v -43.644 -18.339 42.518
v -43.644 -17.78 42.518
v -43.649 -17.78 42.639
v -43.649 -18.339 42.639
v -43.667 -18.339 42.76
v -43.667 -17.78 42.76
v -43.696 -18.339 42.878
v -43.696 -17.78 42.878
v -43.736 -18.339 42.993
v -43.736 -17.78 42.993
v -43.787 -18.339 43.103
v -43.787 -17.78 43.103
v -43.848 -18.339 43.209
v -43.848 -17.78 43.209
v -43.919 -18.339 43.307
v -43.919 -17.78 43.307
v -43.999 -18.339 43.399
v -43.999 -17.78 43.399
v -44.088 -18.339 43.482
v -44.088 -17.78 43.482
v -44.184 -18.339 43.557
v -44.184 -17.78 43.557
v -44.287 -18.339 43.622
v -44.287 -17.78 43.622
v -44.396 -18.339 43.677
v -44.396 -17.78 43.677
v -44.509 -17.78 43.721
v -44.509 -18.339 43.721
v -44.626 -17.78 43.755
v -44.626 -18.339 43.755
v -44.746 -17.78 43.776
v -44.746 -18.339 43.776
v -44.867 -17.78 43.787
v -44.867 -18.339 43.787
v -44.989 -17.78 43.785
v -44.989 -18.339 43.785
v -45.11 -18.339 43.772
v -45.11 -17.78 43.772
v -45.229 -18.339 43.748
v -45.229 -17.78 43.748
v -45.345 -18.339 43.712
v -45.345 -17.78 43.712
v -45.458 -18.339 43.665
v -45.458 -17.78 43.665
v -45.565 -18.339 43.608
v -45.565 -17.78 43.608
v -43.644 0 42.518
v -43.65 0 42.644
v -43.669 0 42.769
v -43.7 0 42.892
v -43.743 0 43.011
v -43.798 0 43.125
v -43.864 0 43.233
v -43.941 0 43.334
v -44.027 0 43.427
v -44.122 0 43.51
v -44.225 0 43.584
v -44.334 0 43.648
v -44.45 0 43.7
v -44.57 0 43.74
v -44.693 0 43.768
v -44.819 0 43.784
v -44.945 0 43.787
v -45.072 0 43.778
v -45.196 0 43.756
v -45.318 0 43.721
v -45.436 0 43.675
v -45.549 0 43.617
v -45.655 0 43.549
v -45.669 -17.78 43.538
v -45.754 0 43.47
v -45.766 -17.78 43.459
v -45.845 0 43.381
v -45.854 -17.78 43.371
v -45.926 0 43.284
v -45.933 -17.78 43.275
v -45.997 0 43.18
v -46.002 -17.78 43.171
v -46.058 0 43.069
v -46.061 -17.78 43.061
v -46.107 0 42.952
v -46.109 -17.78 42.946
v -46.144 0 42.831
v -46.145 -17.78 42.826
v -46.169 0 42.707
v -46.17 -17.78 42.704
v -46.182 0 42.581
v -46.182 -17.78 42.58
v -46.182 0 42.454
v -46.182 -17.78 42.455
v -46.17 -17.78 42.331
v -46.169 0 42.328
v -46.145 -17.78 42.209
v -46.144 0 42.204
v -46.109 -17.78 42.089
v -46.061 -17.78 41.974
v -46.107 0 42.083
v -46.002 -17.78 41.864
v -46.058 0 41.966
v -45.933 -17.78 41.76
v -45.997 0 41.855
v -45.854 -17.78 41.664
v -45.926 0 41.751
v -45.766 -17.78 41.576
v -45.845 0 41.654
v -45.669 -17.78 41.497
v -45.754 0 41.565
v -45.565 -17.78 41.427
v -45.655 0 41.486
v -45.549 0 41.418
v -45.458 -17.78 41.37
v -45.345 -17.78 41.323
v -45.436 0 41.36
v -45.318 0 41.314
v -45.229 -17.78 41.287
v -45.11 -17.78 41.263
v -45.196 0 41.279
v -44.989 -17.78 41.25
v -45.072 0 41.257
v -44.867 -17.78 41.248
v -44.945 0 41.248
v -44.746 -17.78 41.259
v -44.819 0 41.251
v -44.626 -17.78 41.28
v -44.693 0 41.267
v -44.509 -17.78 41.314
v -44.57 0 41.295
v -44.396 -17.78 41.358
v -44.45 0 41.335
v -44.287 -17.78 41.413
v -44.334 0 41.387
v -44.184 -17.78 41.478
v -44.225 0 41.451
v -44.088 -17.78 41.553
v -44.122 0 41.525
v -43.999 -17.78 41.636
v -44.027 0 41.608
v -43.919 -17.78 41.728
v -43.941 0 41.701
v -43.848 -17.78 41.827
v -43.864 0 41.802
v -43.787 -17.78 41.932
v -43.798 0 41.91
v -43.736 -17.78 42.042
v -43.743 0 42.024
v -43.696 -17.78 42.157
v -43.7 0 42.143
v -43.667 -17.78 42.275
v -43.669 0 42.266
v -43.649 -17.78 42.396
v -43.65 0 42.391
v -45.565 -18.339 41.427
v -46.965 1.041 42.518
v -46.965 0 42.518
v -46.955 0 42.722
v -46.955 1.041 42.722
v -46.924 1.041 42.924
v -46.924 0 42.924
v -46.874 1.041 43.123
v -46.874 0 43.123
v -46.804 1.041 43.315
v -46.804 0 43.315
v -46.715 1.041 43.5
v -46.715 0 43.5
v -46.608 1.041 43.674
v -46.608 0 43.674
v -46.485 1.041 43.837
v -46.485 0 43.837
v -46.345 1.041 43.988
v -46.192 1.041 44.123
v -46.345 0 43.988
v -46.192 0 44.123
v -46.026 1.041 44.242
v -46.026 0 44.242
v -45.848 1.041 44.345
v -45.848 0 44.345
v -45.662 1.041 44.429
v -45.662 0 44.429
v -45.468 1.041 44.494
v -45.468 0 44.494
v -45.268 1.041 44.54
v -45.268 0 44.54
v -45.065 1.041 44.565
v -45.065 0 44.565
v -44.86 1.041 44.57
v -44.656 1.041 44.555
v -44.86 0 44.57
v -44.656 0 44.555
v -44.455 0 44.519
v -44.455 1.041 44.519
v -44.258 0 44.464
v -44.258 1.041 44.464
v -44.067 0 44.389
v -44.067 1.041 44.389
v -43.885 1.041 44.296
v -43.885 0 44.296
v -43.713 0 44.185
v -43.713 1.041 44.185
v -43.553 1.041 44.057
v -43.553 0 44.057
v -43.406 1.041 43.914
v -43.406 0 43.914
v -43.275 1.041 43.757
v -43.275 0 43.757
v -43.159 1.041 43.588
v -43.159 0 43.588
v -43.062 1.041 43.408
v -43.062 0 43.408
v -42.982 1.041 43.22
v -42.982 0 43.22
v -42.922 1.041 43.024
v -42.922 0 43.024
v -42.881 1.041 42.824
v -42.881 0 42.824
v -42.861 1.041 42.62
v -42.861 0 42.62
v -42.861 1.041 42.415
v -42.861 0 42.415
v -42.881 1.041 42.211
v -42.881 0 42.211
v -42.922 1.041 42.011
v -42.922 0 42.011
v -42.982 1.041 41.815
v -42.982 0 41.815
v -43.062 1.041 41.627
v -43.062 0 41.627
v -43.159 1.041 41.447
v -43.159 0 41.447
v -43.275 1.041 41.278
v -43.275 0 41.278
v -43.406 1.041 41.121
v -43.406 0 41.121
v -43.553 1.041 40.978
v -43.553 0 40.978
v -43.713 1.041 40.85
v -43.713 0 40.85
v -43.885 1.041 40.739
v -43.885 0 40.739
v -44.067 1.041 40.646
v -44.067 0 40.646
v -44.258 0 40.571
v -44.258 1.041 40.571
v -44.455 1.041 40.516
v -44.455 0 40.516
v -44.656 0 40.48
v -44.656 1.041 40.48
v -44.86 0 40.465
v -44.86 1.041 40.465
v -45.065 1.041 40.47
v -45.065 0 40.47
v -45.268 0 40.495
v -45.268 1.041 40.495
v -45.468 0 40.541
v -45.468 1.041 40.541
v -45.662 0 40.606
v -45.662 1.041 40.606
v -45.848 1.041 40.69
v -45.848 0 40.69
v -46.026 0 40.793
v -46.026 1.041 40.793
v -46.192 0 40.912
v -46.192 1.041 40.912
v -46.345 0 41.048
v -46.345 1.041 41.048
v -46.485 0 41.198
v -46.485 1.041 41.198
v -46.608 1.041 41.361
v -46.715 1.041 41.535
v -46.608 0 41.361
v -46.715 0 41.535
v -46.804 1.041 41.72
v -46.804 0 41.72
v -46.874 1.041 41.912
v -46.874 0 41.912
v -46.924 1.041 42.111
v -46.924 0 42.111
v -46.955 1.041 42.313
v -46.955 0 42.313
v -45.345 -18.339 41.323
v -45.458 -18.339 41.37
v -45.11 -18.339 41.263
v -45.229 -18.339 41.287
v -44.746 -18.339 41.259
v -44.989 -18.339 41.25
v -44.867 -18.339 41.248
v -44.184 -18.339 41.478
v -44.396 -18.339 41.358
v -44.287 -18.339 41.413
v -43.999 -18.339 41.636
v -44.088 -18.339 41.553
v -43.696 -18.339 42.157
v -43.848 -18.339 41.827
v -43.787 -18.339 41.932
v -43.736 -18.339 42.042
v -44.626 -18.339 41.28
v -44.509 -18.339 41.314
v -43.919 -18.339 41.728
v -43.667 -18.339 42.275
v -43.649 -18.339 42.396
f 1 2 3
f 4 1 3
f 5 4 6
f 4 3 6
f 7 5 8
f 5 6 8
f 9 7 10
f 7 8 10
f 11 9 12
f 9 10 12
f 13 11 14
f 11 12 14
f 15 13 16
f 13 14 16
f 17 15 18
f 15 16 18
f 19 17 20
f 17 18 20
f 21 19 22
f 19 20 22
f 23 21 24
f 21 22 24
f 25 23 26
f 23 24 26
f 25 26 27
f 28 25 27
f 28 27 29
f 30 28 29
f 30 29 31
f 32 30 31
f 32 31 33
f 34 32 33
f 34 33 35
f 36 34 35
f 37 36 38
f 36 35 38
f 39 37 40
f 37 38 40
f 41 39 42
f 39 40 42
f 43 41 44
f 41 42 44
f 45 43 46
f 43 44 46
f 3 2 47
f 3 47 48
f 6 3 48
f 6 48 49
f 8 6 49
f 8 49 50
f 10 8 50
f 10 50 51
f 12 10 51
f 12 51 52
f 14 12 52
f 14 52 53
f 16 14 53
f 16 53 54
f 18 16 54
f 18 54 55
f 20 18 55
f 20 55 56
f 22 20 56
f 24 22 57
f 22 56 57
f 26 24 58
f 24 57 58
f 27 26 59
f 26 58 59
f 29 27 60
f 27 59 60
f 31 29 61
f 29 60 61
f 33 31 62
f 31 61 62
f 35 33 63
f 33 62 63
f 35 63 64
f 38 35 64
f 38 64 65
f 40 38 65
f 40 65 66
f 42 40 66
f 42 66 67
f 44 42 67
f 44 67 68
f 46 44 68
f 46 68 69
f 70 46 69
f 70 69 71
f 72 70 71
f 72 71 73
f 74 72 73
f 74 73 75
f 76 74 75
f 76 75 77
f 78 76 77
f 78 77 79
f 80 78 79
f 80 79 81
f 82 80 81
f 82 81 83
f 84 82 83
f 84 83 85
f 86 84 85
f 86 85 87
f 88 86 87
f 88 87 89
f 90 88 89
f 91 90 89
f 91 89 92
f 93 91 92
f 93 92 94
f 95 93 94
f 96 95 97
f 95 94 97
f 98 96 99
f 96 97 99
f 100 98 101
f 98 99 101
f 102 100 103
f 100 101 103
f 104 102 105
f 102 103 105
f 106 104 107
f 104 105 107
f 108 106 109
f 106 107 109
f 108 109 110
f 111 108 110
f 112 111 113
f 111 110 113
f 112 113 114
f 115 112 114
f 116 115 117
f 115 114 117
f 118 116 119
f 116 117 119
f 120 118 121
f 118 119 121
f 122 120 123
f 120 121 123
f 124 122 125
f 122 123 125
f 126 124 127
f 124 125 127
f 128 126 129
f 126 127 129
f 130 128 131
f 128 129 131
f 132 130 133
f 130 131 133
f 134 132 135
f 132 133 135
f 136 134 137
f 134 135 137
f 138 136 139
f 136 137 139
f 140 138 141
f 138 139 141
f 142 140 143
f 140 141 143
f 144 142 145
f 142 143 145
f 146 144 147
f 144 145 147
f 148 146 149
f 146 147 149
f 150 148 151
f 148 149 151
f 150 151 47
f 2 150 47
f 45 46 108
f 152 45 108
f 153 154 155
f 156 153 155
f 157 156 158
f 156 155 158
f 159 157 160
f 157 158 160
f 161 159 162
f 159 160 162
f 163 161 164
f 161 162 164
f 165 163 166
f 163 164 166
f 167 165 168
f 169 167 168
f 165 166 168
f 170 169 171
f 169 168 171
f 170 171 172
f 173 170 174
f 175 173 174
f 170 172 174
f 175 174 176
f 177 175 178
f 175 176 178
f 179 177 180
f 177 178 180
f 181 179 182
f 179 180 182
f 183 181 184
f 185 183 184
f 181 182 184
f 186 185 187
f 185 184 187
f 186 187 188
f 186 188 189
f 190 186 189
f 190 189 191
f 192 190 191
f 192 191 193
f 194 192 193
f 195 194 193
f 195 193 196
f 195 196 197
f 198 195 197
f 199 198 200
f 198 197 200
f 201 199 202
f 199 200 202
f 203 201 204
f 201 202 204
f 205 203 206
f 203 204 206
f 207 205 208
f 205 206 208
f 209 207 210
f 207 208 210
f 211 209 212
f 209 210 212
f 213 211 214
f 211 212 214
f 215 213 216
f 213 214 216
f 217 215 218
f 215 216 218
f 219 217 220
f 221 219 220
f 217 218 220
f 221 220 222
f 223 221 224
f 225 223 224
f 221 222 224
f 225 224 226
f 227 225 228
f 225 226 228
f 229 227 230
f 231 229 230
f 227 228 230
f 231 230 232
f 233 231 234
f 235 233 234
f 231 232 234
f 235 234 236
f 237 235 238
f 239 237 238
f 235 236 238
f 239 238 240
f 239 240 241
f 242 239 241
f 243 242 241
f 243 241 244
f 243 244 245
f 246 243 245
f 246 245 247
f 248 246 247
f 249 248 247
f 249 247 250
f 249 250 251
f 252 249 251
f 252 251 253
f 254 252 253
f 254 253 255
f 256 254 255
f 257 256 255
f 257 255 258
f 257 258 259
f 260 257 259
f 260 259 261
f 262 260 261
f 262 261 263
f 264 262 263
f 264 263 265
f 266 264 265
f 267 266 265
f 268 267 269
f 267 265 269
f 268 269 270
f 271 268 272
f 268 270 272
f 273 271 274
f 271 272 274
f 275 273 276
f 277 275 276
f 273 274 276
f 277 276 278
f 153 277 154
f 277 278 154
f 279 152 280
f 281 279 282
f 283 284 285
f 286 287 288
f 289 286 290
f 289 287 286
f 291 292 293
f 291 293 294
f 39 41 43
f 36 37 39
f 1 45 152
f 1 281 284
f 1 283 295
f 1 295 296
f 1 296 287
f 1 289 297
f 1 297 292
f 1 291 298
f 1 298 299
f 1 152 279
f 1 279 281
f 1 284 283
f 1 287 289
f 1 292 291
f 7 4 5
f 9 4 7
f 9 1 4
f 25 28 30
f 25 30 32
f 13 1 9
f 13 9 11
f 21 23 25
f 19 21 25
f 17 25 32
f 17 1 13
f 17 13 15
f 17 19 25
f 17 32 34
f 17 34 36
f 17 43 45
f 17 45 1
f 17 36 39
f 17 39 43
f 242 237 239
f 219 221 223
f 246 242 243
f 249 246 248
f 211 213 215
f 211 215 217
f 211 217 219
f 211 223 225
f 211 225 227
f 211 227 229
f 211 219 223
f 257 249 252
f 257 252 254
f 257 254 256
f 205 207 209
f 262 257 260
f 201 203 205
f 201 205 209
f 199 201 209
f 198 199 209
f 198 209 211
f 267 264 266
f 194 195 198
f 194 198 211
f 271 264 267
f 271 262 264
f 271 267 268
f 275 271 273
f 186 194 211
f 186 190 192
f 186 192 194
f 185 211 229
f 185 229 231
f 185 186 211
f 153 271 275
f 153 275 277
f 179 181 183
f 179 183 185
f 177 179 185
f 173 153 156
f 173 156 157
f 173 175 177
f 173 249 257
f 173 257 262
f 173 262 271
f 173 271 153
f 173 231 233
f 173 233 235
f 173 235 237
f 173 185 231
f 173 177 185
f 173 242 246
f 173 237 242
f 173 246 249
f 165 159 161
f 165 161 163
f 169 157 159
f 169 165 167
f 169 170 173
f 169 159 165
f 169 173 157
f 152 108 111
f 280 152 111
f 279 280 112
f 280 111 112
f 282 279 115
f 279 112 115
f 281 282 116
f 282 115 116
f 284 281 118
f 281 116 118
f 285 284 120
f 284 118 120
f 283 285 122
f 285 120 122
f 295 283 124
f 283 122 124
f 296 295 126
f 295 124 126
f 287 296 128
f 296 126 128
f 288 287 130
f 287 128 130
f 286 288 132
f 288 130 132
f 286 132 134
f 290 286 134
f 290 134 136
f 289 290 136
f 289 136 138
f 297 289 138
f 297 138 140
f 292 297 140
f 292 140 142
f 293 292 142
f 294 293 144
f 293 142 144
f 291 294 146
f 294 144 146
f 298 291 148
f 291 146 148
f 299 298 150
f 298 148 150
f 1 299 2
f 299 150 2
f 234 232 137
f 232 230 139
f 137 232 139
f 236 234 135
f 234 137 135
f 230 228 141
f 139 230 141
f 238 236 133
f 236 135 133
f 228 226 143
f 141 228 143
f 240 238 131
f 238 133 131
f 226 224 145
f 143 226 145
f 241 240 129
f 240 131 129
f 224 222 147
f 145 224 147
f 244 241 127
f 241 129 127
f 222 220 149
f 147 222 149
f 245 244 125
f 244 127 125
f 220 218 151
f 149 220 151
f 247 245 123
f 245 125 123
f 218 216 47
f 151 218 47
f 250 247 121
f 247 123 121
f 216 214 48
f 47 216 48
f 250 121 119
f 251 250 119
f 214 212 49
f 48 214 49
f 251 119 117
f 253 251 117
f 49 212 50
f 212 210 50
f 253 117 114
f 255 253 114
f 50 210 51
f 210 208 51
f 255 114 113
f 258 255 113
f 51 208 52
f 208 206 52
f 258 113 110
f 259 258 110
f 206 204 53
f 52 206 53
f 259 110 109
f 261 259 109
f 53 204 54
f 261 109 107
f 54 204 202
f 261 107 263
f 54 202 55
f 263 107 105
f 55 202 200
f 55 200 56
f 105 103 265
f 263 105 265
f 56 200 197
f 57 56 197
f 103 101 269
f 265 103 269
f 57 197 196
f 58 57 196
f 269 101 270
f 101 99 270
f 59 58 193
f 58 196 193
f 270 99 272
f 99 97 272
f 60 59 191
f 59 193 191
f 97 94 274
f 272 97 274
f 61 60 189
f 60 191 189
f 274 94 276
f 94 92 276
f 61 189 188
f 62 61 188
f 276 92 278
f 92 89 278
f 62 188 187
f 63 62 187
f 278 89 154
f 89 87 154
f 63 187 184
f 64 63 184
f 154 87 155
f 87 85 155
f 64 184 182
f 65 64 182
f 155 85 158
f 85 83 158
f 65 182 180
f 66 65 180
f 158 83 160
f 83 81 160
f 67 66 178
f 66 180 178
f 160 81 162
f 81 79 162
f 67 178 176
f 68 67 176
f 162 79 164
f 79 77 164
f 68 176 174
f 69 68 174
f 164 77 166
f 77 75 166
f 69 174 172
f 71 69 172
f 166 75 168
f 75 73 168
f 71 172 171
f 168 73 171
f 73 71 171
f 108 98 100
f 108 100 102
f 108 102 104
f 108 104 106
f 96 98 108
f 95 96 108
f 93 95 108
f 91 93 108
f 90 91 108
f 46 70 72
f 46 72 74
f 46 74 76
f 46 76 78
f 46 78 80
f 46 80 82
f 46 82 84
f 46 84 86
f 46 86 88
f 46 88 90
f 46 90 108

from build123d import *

# Parameters (mm, degrees)
F0_R     = 1.27
F1_DEPTH = 17.78
F2_R     = 2.0534537801
F3_DEPTH = 1.0414
F5_DEPTH = 0.5588


with BuildPart() as f1:
    # F0 (on Front) → F1 (new body)
    with BuildSketch(Plane.XZ):
        with Locations((-44.9135862291, 42.5175279379)):
            Circle(F0_R)
    extrude(amount=F1_DEPTH)

    # F2 (on face) → F3 (join)
    with BuildSketch(Plane(origin=(0, 0, 0), x_dir=(-1, 0, 0), z_dir=(0, 1, 0))):
        with Locations((44.9116155505, 42.5175279379)):
            Circle(F2_R)
        with BuildLine():
            ThreePointArc((44.2763268948, 41.4189832001), (43.6435862291, 42.5175279379), (44.2763268948, 43.6160726756))
            ThreePointArc((44.2763268948, 43.6160726756), (44.9113103393, 43.7875258986), (45.5469042063, 43.6183496036))
            ThreePointArc((45.5469042063, 43.6183496036), (46.0129528265, 43.1533683931), (46.1835862291, 42.5175279379))
            ThreePointArc((46.1835862291, 42.5175279379), (45.5474555553, 41.4170236547), (44.2763268948, 41.4189832001))
        make_face(mode=Mode.SUBTRACT)
        Polygon((44.2763268948, 43.6160726756), (44.2763268948, 42.5175279379), (44.2763268948, 41.4189832001), (45.5469042063, 41.4189832001), (45.5469042063, 43.6183496036), align=None)
        with BuildLine():
            Line((45.5469042063, 41.4189832001), (44.2763268948, 41.4189832001))
            ThreePointArc((44.2763268948, 41.4189832001), (45.5474555553, 41.4170236547), (46.1835862291, 42.5175279379))
            ThreePointArc((46.1835862291, 42.5175279379), (46.0129528265, 43.1533683931), (45.5469042063, 43.6183496036))
            Line((45.5469042063, 43.6183496036), (45.5469042063, 41.4189832001))
        make_face()
        with BuildLine():
            Line((44.2763268948, 41.4189832001), (44.2763268948, 42.5175279379))
            Line((44.2763268948, 42.5175279379), (44.2763268948, 43.6160726756))
            ThreePointArc((44.2763268948, 43.6160726756), (43.6435862291, 42.5175279379), (44.2763268948, 41.4189832001))
        make_face()
        with BuildLine():
            ThreePointArc((45.5469042063, 43.6183496036), (44.9113103393, 43.7875258986), (44.2763268948, 43.6160726756))
            Line((44.2763268948, 43.6160726756), (45.5469042063, 43.6183496036))
        make_face()
    extrude(amount=F3_DEPTH)

    # F4 (on face) → F5 (join)
    with BuildSketch(Plane.XZ.offset(17.78)):
        with BuildLine():
            Line((-45.5651804805, 43.6076311126), (-45.5651804805, 42.5175279379))
            Line((-45.5651804805, 42.5175279379), (-45.5651804805, 41.4274247632))
            ThreePointArc((-45.5651804805, 41.4274247632), (-44.2869382814, 41.4128957142), (-43.6435862291, 42.5175279379))
            ThreePointArc((-43.6435862291, 42.5175279379), (-44.2869382814, 43.6221601616), (-45.5651804805, 43.6076311126))
        make_face()
    extrude(amount=F5_DEPTH)


solid = f1.part
